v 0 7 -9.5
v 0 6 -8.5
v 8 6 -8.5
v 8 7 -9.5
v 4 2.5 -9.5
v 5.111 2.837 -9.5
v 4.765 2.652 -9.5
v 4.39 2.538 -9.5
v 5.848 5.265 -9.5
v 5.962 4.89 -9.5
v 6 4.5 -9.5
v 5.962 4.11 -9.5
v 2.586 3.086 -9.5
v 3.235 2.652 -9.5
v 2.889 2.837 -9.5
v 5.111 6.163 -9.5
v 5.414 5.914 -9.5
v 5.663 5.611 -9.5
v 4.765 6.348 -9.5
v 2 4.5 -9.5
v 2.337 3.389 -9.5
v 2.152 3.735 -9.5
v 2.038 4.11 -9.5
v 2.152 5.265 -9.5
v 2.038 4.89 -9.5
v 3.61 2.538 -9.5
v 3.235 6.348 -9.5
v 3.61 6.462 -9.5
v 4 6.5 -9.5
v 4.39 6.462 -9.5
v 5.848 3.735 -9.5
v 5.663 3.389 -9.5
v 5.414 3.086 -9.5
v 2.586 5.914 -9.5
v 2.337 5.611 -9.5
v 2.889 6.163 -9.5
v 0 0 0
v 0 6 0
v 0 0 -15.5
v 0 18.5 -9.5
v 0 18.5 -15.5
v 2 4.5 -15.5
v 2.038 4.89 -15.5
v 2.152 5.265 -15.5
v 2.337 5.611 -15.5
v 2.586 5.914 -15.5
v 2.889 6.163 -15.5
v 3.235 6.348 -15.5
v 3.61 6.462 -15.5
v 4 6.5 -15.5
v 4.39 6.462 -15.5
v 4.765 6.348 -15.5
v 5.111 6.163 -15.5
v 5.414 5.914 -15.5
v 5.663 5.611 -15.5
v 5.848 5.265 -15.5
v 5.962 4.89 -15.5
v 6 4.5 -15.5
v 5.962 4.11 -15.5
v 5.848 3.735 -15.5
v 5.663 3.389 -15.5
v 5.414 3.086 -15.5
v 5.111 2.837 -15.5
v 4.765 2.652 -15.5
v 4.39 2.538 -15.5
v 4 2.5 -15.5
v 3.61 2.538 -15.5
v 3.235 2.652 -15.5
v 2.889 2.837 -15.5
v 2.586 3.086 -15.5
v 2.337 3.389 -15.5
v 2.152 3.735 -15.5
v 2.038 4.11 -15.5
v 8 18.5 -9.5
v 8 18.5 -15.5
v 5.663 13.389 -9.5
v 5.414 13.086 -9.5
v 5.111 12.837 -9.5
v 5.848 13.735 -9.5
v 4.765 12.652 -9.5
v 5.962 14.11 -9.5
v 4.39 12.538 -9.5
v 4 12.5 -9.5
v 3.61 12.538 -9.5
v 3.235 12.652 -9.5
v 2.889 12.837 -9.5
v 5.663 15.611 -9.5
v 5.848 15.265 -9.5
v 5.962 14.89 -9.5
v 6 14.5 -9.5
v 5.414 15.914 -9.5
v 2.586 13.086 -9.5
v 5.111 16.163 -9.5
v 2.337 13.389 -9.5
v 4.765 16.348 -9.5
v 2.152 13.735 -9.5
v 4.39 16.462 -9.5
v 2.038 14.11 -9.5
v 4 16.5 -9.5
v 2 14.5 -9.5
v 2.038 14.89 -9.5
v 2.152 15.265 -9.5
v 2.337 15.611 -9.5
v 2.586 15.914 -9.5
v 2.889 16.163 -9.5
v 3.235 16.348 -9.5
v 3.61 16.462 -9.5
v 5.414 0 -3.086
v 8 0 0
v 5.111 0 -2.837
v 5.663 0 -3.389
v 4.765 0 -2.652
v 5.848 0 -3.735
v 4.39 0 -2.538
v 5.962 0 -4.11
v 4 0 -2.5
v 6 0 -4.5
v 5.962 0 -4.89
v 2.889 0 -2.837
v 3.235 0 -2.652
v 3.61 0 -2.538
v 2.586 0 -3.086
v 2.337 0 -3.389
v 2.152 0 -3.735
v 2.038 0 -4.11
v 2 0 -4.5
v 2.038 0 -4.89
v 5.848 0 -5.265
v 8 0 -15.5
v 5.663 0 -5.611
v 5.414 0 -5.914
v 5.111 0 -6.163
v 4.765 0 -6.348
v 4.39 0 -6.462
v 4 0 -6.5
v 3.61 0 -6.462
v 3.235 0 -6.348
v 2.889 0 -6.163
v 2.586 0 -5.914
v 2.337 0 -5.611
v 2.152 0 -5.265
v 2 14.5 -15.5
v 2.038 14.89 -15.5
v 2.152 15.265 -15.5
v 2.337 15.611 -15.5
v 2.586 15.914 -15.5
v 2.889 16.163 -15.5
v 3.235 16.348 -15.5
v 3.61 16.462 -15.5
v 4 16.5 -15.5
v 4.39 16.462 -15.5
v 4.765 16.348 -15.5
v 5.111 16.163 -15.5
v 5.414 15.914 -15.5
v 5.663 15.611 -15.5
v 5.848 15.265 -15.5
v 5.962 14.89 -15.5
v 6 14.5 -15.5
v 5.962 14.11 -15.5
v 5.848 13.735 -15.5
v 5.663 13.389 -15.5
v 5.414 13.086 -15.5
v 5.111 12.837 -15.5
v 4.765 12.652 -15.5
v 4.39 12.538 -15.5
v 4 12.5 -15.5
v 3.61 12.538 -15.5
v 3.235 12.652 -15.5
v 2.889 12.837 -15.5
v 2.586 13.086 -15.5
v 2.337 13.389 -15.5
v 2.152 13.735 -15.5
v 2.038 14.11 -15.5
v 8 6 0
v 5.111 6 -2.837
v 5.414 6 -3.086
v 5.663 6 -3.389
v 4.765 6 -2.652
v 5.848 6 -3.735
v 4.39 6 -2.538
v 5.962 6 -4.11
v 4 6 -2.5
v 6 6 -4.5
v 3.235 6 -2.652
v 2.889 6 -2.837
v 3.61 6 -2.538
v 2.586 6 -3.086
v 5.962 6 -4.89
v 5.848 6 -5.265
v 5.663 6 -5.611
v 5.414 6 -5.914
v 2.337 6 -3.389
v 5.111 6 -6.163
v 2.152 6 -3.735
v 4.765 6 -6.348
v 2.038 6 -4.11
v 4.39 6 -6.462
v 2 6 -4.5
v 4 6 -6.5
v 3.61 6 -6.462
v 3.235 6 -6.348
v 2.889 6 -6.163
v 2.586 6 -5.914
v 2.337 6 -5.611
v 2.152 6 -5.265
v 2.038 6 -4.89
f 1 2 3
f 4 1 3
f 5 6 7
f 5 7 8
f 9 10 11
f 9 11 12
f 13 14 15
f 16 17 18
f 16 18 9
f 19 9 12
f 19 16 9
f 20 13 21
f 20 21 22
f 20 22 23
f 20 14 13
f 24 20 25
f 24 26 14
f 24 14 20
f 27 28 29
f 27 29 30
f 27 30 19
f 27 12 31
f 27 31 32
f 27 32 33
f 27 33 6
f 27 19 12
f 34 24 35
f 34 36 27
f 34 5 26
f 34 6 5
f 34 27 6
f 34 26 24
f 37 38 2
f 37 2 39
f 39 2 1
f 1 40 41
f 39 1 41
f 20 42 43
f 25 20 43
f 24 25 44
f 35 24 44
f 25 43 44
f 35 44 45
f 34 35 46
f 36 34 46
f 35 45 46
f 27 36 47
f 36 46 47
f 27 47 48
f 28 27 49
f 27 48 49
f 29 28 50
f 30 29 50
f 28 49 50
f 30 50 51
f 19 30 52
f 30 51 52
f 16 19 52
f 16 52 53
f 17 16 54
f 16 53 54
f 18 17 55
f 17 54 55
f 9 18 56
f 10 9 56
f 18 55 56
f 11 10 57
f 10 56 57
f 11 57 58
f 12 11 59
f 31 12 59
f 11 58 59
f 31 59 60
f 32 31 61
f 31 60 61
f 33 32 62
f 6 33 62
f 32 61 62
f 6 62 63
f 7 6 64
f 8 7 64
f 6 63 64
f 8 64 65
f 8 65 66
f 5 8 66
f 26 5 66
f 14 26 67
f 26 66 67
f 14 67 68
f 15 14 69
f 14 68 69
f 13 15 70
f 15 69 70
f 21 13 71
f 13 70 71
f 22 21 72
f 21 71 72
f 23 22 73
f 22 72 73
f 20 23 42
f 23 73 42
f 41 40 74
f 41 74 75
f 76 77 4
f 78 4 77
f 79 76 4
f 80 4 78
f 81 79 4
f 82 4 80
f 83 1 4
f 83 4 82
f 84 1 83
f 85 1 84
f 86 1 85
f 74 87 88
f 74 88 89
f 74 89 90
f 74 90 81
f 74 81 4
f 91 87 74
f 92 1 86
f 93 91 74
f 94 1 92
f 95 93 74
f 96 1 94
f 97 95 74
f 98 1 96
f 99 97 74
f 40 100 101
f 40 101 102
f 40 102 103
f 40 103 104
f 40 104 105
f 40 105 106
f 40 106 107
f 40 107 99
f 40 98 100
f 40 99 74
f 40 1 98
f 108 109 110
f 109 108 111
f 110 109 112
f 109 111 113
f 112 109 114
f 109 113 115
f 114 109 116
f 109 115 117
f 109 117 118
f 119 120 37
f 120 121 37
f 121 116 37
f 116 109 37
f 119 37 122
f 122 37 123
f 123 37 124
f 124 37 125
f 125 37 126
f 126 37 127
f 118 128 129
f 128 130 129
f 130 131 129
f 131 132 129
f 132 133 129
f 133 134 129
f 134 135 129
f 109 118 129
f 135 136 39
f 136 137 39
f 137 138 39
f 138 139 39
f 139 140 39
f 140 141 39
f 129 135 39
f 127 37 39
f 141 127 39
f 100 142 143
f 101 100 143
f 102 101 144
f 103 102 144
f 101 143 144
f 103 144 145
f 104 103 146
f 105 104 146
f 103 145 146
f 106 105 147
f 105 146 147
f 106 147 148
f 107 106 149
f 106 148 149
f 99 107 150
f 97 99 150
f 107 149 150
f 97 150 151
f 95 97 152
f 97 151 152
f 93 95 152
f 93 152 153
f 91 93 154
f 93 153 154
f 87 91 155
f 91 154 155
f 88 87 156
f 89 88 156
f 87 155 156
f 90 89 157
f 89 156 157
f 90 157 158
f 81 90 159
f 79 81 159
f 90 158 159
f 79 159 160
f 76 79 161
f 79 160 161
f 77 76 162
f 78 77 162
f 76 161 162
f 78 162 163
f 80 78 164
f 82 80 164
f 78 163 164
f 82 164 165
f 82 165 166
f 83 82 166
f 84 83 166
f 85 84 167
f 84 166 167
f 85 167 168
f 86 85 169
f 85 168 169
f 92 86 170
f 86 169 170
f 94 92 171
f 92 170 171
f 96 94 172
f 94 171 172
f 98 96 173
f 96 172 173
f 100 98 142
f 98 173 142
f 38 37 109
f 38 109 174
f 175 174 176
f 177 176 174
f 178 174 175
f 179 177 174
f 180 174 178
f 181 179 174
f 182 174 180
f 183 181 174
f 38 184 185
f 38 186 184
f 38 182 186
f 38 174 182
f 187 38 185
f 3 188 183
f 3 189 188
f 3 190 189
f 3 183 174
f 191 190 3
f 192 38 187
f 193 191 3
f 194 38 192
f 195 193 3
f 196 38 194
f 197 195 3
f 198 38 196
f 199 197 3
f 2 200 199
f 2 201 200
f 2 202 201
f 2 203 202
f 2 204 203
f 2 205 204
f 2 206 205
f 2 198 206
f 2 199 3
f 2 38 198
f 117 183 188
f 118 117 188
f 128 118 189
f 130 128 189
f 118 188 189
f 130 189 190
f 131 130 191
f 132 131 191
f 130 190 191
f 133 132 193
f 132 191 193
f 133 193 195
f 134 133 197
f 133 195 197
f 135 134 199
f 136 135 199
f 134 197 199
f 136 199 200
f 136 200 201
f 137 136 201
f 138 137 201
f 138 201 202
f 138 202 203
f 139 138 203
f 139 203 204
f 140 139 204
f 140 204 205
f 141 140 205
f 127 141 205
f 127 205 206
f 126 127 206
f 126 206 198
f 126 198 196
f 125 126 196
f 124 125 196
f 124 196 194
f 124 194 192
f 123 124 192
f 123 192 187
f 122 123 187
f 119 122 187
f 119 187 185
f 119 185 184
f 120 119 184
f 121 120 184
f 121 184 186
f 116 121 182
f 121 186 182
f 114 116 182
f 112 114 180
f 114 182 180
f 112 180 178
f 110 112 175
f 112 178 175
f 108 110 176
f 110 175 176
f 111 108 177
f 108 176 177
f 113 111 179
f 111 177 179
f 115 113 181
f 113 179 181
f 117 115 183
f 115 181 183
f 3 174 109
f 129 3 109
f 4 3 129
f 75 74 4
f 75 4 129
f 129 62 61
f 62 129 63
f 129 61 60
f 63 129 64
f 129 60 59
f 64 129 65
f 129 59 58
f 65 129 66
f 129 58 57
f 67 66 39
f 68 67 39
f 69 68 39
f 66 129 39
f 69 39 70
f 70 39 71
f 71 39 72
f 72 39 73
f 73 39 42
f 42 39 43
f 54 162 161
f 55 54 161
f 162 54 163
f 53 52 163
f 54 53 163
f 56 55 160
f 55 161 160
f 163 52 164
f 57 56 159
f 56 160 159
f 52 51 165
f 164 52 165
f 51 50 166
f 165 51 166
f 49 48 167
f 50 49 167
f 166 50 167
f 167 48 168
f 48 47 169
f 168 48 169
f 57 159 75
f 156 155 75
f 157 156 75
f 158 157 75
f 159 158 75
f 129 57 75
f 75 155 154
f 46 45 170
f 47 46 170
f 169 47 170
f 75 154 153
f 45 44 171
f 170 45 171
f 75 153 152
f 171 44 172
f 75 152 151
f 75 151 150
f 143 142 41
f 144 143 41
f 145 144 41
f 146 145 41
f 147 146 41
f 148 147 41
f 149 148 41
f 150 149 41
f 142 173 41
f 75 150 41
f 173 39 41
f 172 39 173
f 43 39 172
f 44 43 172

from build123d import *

# Parameters (mm, degrees)
SKETCH1_W           = 6
SKETCH1_H           = 12.5
SKETCH1_W_2         = 15.5
SKETCH1_H_2         = 6
BOSS_EXTRUDE1_DEPTH = 8
CHAMFER1_SIZE       = 1
SKETCH2_R           = 2
CUT_EXTRUDE1_DEPTH  = 6
SKETCH3_R           = 2
CUT_EXTRUDE2_DEPTH  = 7


with BuildPart() as part:
    # Sketch1 → Boss-Extrude1 (new body)
    with BuildSketch(Plane(origin=(0, 0, 0), x_dir=(0, 0, -1), z_dir=(1, 0, 0))):
        with Locations((12.5, 12.25)):
            Rectangle(SKETCH1_W, SKETCH1_H)
        with Locations((7.75, 3)):
            Rectangle(SKETCH1_W_2, SKETCH1_H_2)
    extrude(amount=BOSS_EXTRUDE1_DEPTH)

    # Chamfer1
    chamfer1_edges = [part.edges().sort_by_distance(p)[0] for p in [
        (4, 6, -9.5),
    ]]
    chamfer(chamfer1_edges, length=CHAMFER1_SIZE)

    # Sketch2 → Cut-Extrude1 (cut)
    with BuildSketch(Plane(origin=(0, 0, -15.5), x_dir=(-1, 0, 0), z_dir=(0, 0, -1))):
        with Locations((-4, 14.5)):
            Circle(SKETCH2_R)
        with Locations((-4, 4.5)):
            Circle(SKETCH2_R)
    extrude(amount=-CUT_EXTRUDE1_DEPTH, mode=Mode.SUBTRACT)

    # Sketch3 → Cut-Extrude2 (cut, through all)
    with BuildSketch(Plane(origin=(0, 6, 0), x_dir=(1, 0, 0), z_dir=(0, 1, 0))):
        with Locations((4, 4.5)):
            Circle(SKETCH3_R)
    extrude(amount=-CUT_EXTRUDE2_DEPTH, mode=Mode.SUBTRACT)


solid = part.part
